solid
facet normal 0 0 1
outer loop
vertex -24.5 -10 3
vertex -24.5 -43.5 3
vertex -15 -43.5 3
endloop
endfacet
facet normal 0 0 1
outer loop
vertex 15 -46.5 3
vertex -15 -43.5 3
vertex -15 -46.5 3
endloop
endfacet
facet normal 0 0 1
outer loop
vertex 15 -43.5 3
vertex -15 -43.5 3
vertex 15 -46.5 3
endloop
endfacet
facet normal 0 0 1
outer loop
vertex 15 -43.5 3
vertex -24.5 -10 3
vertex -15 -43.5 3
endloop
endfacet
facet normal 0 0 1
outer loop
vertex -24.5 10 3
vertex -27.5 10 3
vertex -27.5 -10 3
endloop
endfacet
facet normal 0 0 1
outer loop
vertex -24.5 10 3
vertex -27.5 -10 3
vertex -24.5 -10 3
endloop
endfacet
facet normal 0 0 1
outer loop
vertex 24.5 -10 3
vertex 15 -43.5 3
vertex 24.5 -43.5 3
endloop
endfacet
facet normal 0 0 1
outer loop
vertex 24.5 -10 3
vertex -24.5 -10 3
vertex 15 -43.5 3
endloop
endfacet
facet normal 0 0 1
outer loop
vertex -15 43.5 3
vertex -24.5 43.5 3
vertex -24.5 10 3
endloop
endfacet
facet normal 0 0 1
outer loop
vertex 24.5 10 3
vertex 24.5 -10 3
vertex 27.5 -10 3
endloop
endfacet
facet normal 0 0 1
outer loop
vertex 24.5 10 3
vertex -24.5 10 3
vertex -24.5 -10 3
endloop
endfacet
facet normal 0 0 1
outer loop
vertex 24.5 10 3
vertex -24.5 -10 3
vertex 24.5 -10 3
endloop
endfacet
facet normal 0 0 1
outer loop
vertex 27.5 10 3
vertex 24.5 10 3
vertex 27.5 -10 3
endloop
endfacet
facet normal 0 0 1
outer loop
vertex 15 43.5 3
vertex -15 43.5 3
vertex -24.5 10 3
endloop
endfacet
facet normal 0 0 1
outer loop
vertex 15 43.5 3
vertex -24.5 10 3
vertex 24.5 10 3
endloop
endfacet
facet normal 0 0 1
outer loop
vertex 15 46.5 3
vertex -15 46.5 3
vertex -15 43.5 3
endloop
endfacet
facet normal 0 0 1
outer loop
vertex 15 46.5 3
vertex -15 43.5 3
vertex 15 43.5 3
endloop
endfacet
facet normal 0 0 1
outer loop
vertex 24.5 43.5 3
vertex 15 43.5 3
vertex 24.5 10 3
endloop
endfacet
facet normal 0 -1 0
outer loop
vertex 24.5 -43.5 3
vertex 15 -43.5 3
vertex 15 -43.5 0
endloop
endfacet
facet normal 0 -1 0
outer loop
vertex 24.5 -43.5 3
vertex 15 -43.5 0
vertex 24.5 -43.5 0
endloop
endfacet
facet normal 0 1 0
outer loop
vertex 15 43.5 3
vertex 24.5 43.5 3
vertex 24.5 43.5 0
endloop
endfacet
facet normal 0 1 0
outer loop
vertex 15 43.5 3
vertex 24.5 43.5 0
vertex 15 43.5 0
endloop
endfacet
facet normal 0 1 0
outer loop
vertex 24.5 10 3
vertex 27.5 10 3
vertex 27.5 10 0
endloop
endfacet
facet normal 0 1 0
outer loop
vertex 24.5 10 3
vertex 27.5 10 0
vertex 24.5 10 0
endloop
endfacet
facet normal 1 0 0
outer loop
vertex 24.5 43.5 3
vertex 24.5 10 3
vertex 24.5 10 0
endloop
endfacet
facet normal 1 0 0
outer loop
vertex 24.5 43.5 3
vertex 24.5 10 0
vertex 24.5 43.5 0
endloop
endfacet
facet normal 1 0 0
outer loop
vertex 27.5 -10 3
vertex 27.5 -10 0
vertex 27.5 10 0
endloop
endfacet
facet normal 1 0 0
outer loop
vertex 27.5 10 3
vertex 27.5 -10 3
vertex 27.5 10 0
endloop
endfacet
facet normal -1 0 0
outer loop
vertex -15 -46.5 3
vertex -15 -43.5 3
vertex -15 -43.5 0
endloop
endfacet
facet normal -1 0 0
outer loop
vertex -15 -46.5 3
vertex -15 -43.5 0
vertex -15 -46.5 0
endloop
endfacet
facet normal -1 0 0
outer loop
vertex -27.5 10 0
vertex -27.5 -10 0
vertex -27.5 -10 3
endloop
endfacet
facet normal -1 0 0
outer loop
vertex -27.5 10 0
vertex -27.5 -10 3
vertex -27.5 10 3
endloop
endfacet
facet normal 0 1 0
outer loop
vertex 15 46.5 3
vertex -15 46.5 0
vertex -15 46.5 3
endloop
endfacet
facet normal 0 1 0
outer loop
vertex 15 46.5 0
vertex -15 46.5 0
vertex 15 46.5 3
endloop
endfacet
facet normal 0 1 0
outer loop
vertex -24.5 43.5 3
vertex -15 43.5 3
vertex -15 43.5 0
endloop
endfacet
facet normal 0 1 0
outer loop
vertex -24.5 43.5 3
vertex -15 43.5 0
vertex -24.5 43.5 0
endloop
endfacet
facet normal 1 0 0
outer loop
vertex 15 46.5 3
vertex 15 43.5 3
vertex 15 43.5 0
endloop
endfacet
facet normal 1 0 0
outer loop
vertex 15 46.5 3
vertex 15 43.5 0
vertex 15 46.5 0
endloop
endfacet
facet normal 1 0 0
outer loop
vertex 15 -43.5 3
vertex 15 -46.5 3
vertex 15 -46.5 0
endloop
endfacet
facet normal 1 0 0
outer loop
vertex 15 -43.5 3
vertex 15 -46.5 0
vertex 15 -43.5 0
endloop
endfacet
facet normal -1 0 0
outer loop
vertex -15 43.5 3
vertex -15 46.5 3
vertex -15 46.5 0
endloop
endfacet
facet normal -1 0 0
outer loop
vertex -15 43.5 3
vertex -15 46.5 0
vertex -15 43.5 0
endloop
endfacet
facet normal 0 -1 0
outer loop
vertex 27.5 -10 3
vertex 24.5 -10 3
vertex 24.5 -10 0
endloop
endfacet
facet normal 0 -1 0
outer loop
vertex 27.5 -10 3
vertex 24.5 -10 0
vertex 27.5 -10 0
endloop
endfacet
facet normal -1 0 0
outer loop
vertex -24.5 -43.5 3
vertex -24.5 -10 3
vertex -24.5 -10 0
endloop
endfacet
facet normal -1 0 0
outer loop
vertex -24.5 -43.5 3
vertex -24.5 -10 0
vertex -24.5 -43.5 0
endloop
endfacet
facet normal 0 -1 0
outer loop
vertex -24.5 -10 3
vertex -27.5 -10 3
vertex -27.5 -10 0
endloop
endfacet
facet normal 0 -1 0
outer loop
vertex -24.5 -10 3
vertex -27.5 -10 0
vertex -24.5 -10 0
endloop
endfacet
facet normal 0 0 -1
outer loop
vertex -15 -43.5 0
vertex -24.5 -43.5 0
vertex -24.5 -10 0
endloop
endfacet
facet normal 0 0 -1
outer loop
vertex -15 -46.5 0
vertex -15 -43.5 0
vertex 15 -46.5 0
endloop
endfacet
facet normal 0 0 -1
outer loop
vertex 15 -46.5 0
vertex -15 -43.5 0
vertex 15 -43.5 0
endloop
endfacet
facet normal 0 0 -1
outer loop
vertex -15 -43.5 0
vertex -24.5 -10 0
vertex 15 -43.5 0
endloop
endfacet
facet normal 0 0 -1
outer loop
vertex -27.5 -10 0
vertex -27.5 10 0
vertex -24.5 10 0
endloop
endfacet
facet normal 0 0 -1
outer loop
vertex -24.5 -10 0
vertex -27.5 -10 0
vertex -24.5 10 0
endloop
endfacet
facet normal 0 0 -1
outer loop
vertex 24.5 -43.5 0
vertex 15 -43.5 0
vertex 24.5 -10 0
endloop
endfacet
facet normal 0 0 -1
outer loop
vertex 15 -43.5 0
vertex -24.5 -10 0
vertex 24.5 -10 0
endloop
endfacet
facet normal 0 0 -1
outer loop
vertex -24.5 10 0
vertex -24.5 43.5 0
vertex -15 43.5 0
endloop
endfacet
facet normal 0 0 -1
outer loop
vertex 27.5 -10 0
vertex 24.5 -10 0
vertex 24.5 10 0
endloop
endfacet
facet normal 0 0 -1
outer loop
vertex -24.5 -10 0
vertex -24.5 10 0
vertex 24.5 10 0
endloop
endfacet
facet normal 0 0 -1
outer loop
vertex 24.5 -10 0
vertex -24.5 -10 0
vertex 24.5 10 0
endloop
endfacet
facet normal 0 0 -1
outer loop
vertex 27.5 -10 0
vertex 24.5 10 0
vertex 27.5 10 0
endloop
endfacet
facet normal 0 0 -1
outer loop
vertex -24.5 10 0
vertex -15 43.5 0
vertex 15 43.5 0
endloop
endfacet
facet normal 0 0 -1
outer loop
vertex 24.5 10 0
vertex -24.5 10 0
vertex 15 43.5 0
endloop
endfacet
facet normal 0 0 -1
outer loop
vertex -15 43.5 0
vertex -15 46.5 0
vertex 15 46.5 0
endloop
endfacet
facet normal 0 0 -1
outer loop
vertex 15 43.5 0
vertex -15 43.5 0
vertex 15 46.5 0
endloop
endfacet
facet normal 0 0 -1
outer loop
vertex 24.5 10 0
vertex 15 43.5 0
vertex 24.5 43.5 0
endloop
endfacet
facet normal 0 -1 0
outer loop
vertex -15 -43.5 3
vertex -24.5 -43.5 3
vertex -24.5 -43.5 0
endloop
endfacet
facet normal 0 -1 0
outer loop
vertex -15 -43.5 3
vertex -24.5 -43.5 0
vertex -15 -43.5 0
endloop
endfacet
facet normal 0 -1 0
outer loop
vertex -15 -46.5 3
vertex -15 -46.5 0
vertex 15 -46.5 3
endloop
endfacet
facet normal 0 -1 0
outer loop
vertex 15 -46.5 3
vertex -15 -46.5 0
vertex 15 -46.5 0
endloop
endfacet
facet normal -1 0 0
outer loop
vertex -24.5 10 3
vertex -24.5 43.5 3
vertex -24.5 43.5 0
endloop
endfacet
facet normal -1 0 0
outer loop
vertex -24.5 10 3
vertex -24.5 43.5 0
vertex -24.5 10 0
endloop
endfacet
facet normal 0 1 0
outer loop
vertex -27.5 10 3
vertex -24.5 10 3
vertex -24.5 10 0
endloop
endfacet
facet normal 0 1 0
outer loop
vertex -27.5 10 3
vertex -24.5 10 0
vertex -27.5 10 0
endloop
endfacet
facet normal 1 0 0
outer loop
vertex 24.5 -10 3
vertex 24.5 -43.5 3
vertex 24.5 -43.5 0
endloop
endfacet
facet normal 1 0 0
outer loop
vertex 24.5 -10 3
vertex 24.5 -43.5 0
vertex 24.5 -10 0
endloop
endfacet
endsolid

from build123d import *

# Parameters (mm, degrees)
SKETCH1_W           = 55
SKETCH1_H           = 93
BOSS_EXTRUDE1_DEPTH = 3
CUT_EXTRUDE2_DEPTH  = 3


with BuildPart() as part:
    # Sketch1 → Boss-Extrude1 (new body)
    with BuildSketch(Plane.XY):
        Rectangle(SKETCH1_W, SKETCH1_H)
    extrude(amount=BOSS_EXTRUDE1_DEPTH)

    # Sketch2 → Cut-Extrude2 (cut)
    with BuildSketch(Plane.XY.offset(3)):
        Polygon((-27.5, 46.5), (-19.5, 46.5), (-15, 46.5), (-15, 43.5), (-24.5, 43.5), (-24.5, 10), (-27.5, 10), align=None)
        Polygon((-27.5, -46.5), (-27.5, -10), (-24.5, -10), (-24.5, -43.5), (-15, -43.5), (-15, -46.5), (-19.5, -46.5), align=None)
        Polygon((27.5, -46.5), (19.5, -46.5), (15, -46.5), (15, -43.5), (24.5, -43.5), (24.5, -10), (27.5, -10), align=None)
        Polygon((27.5, 46.5), (27.5, 10), (24.5, 10), (24.5, 43.5), (15, 43.5), (15, 46.5), (19.5, 46.5), align=None)
    extrude(amount=-CUT_EXTRUDE2_DEPTH, mode=Mode.SUBTRACT)


solid = part.part
